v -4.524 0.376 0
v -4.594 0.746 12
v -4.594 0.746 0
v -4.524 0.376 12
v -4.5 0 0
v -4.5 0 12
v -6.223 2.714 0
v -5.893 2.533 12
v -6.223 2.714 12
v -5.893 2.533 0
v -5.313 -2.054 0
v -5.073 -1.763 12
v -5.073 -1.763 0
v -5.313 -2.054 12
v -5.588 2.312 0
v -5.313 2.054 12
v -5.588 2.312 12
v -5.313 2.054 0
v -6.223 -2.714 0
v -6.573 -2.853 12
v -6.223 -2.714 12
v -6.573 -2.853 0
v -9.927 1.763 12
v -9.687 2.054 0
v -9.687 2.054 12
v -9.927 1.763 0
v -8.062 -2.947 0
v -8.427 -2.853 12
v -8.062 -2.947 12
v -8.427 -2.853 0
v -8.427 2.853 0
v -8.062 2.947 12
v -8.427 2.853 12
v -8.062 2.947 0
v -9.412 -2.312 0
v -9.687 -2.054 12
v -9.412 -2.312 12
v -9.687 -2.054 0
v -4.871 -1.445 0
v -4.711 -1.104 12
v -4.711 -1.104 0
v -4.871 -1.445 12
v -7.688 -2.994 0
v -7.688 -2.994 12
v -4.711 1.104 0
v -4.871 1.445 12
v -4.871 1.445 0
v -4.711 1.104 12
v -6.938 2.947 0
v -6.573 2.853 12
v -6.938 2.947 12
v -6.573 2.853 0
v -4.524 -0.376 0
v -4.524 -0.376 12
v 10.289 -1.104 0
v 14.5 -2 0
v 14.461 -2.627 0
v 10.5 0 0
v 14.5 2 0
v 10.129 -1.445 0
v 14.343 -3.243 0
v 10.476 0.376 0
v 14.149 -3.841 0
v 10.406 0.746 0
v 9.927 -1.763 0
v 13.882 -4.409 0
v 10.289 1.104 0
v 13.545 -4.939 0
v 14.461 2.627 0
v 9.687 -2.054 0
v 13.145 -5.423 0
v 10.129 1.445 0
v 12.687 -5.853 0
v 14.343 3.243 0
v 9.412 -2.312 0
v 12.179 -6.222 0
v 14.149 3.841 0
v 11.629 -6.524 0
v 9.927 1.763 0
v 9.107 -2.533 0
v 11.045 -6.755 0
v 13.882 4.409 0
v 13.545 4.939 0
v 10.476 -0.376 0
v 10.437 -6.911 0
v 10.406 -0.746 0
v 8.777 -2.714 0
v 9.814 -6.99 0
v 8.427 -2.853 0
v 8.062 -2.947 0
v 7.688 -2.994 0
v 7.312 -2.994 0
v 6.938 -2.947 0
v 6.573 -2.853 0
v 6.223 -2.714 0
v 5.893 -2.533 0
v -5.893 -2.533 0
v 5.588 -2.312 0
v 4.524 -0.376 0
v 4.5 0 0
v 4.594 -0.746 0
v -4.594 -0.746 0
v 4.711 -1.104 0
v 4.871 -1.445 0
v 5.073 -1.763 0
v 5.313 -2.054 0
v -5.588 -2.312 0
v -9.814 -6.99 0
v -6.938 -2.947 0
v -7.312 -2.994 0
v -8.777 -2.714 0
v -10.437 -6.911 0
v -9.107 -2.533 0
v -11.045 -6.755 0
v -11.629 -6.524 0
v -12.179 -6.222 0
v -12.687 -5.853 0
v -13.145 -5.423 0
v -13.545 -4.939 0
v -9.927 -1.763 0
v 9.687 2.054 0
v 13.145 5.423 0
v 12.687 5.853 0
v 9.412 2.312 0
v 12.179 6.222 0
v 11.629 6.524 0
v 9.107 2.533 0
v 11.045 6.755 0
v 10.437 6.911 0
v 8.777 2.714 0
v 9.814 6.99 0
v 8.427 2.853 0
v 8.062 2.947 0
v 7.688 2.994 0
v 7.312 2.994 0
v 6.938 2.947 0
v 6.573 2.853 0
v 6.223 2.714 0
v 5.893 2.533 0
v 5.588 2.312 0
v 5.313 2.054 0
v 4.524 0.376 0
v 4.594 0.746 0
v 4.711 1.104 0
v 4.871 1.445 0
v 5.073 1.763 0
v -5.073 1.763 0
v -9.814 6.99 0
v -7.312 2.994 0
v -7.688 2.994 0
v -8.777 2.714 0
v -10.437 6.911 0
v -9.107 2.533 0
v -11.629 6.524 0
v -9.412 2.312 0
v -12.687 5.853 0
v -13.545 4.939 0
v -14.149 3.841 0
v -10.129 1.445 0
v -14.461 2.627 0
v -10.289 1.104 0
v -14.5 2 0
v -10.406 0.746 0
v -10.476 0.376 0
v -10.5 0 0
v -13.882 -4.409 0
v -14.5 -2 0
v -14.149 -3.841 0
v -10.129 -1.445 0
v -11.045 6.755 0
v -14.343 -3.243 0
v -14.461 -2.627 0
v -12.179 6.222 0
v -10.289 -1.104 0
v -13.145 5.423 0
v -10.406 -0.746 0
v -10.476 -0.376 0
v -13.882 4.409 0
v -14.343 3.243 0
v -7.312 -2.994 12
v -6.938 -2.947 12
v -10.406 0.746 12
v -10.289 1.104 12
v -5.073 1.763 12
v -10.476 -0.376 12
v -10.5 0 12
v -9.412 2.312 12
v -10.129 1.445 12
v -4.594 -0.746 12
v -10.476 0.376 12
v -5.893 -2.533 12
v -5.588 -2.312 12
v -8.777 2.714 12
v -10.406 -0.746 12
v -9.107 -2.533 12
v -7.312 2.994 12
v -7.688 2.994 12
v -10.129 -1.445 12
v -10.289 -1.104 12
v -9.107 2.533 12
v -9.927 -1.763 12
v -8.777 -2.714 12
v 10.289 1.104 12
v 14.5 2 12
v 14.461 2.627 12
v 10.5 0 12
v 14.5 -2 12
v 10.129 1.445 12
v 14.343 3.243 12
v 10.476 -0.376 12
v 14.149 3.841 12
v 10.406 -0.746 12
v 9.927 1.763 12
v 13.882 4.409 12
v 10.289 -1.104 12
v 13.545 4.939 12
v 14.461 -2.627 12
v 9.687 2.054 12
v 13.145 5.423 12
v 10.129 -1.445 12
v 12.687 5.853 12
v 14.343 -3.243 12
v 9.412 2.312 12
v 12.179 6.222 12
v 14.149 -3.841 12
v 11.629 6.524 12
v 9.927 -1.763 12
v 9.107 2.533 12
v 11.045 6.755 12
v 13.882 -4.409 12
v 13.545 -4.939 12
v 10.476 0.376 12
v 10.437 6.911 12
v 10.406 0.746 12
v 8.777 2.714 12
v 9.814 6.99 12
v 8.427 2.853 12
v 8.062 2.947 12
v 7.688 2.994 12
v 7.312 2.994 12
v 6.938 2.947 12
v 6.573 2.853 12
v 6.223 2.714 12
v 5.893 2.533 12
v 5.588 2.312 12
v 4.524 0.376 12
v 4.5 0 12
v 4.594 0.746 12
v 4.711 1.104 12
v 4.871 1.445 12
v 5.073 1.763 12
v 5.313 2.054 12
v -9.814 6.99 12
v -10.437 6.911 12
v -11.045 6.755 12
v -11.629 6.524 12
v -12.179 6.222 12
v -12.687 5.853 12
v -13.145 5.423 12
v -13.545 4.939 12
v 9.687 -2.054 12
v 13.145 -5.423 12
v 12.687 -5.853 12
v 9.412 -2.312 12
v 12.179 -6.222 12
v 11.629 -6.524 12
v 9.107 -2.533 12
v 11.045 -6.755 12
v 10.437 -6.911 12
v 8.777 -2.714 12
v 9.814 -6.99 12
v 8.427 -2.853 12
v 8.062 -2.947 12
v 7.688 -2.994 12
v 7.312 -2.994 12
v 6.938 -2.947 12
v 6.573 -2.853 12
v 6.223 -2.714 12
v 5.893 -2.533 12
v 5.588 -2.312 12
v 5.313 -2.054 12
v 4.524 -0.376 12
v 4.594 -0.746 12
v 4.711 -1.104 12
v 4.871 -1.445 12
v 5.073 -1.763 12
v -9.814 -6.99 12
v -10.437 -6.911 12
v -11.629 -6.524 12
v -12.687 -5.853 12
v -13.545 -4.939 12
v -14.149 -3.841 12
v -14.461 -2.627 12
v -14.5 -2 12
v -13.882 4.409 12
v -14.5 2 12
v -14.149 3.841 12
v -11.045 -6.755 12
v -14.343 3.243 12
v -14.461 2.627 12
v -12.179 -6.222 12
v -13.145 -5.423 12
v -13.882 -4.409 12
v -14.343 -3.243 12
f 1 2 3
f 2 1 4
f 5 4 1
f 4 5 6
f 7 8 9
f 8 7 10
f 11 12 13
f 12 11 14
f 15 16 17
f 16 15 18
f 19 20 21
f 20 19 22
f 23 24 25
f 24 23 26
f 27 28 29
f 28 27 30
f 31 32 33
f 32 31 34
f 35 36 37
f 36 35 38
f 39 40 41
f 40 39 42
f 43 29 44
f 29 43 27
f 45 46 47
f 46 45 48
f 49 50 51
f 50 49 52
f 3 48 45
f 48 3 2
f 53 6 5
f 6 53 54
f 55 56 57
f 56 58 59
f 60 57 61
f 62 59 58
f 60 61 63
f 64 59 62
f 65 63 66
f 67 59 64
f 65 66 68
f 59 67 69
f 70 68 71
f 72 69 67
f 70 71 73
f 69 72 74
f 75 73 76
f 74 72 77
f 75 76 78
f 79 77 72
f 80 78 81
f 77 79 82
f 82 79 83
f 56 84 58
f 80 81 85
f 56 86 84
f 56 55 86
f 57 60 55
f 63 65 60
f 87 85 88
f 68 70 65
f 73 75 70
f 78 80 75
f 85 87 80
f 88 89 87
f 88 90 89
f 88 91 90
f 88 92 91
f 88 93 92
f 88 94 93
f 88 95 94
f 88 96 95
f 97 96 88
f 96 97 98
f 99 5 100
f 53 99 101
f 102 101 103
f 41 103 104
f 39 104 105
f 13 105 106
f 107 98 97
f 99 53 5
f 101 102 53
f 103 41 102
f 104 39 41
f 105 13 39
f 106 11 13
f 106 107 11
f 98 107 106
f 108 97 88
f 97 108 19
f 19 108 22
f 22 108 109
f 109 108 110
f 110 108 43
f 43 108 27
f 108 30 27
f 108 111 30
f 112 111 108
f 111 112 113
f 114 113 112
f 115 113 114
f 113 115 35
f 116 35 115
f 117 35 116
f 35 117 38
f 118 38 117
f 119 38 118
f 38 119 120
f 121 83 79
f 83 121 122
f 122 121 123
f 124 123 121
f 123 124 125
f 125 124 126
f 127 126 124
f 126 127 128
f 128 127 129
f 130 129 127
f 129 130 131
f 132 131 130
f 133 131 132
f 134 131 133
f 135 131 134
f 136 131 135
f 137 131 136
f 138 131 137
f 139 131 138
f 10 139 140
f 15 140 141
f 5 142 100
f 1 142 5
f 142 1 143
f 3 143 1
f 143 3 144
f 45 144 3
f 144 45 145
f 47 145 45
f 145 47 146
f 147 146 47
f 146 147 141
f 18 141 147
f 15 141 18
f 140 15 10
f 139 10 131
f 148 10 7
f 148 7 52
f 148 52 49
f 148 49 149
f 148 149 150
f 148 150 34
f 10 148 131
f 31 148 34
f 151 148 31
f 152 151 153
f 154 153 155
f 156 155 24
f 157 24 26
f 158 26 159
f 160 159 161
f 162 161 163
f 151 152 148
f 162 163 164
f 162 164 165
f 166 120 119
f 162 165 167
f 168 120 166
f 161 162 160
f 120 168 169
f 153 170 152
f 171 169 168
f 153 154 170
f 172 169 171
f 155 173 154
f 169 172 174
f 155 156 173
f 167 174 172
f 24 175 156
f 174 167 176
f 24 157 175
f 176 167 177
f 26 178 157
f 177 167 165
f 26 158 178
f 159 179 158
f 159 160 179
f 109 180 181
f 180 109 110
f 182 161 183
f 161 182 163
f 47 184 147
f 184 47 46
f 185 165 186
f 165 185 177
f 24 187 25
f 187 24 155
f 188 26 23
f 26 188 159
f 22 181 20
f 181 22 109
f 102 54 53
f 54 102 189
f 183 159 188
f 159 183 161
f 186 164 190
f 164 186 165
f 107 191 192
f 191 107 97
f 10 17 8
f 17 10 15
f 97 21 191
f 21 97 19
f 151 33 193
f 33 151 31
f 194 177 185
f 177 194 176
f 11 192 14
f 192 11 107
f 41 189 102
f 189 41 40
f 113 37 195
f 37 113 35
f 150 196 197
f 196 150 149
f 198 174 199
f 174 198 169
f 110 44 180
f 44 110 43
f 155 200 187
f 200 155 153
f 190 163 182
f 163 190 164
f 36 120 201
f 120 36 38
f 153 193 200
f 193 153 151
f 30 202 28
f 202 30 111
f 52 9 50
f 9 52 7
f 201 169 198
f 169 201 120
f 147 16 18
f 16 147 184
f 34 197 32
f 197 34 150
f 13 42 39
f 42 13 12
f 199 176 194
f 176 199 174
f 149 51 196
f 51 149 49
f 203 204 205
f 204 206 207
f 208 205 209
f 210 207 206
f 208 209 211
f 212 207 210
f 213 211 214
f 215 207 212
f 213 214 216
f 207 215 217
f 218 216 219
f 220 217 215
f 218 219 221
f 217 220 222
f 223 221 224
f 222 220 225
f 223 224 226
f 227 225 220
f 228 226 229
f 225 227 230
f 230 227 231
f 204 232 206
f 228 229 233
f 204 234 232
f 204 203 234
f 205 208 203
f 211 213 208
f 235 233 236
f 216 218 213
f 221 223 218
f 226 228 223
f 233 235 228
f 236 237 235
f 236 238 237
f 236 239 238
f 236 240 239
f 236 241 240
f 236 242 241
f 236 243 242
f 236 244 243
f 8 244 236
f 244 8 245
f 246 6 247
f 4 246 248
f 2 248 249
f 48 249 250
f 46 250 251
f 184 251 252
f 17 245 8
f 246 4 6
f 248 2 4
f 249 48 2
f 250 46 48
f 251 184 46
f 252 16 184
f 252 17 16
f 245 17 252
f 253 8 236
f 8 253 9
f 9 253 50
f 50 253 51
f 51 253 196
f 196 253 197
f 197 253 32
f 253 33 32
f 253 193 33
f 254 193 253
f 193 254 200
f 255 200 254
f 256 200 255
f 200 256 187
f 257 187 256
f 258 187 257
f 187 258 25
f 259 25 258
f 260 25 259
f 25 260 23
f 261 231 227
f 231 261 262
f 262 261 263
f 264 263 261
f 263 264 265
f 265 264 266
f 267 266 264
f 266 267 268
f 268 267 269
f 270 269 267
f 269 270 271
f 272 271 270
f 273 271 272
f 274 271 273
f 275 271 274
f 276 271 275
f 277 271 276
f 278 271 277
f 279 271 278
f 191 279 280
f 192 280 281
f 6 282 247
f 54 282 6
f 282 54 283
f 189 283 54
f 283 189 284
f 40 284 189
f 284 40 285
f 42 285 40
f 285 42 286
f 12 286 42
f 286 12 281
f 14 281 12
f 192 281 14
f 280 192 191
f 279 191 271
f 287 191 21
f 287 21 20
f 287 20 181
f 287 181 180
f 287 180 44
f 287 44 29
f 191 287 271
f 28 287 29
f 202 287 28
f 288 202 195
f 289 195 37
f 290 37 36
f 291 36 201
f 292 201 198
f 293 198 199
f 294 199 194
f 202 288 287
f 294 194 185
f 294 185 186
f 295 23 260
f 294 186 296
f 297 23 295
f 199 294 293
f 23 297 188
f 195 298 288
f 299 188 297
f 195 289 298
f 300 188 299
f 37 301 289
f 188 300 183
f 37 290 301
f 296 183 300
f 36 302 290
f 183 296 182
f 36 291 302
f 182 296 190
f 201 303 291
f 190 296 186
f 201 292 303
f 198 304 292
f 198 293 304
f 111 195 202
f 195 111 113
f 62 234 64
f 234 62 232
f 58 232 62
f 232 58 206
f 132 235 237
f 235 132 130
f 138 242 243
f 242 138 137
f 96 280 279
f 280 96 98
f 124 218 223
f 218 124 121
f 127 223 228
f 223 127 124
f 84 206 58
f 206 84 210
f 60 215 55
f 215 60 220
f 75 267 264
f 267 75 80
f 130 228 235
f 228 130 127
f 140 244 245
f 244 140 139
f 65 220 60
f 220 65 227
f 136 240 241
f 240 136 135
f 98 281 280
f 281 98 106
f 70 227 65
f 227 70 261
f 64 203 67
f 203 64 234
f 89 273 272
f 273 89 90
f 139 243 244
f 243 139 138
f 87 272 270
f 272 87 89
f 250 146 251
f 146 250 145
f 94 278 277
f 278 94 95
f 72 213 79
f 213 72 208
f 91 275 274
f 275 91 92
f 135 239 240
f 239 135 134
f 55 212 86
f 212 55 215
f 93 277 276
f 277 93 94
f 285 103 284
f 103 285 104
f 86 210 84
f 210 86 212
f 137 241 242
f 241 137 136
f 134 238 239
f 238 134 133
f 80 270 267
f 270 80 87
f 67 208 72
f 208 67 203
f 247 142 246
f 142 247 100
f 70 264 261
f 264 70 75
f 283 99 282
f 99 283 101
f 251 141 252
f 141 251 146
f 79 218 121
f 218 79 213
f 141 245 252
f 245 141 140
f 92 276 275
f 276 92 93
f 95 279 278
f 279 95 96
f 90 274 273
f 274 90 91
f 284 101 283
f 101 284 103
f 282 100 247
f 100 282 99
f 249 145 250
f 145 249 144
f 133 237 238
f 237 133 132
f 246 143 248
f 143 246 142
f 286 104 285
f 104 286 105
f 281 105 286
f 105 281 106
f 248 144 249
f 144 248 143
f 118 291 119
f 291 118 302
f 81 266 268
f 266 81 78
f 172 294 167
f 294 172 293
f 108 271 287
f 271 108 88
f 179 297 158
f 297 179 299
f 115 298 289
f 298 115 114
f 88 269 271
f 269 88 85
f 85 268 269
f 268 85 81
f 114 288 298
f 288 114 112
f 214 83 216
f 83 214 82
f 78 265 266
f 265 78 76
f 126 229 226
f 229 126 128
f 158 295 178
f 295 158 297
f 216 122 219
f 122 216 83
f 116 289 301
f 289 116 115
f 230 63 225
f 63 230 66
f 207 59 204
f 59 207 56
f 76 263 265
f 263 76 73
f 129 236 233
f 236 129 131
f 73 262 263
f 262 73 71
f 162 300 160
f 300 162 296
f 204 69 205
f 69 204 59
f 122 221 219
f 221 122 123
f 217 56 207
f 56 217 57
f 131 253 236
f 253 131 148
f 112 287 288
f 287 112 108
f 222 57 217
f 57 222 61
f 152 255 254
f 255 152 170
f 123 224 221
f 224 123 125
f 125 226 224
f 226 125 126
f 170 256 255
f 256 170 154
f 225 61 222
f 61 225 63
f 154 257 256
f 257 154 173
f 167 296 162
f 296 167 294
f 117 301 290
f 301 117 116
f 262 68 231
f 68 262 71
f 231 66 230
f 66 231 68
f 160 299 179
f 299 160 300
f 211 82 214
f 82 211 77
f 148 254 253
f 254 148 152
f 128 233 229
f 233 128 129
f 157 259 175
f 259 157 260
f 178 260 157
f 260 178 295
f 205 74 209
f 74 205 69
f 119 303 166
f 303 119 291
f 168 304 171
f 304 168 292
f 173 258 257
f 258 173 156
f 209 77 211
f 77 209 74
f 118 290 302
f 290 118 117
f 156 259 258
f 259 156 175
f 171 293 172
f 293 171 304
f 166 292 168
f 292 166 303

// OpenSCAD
$fn = 50;


difference() {
	union() {
		hull() {
			translate(v = [-9.5000000000, 2.0000000000, 0]) {
				cylinder(h = 12, r = 5);
			}
			translate(v = [9.5000000000, 2.0000000000, 0]) {
				cylinder(h = 12, r = 5);
			}
			translate(v = [-9.5000000000, -2.0000000000, 0]) {
				cylinder(h = 12, r = 5);
			}
			translate(v = [9.5000000000, -2.0000000000, 0]) {
				cylinder(h = 12, r = 5);
			}
		}
	}
	union() {
		translate(v = [-7.5000000000, 0.0000000000, 0]) {
			cylinder(h = 12, r = 3.0000000000);
		}
		translate(v = [7.5000000000, 0.0000000000, 0]) {
			cylinder(h = 12, r = 3.0000000000);
		}
		translate(v = [-7.5000000000, 0.0000000000, 0]) {
			cylinder(h = 12, r = 1.5000000000);
		}
		translate(v = [7.5000000000, 0.0000000000, 0]) {
			cylinder(h = 12, r = 1.5000000000);
		}
		translate(v = [-7.5000000000, 0.0000000000, 0]) {
			cylinder(h = 12, r = 1.5000000000);
		}
		translate(v = [7.5000000000, 0.0000000000, 0]) {
			cylinder(h = 12, r = 1.5000000000);
		}
		translate(v = [-7.5000000000, 0.0000000000, 0]) {
			cylinder(h = 12, r = 1.5000000000);
		}
		translate(v = [7.5000000000, 0.0000000000, 0]) {
			cylinder(h = 12, r = 1.5000000000);
		}
	}
}
